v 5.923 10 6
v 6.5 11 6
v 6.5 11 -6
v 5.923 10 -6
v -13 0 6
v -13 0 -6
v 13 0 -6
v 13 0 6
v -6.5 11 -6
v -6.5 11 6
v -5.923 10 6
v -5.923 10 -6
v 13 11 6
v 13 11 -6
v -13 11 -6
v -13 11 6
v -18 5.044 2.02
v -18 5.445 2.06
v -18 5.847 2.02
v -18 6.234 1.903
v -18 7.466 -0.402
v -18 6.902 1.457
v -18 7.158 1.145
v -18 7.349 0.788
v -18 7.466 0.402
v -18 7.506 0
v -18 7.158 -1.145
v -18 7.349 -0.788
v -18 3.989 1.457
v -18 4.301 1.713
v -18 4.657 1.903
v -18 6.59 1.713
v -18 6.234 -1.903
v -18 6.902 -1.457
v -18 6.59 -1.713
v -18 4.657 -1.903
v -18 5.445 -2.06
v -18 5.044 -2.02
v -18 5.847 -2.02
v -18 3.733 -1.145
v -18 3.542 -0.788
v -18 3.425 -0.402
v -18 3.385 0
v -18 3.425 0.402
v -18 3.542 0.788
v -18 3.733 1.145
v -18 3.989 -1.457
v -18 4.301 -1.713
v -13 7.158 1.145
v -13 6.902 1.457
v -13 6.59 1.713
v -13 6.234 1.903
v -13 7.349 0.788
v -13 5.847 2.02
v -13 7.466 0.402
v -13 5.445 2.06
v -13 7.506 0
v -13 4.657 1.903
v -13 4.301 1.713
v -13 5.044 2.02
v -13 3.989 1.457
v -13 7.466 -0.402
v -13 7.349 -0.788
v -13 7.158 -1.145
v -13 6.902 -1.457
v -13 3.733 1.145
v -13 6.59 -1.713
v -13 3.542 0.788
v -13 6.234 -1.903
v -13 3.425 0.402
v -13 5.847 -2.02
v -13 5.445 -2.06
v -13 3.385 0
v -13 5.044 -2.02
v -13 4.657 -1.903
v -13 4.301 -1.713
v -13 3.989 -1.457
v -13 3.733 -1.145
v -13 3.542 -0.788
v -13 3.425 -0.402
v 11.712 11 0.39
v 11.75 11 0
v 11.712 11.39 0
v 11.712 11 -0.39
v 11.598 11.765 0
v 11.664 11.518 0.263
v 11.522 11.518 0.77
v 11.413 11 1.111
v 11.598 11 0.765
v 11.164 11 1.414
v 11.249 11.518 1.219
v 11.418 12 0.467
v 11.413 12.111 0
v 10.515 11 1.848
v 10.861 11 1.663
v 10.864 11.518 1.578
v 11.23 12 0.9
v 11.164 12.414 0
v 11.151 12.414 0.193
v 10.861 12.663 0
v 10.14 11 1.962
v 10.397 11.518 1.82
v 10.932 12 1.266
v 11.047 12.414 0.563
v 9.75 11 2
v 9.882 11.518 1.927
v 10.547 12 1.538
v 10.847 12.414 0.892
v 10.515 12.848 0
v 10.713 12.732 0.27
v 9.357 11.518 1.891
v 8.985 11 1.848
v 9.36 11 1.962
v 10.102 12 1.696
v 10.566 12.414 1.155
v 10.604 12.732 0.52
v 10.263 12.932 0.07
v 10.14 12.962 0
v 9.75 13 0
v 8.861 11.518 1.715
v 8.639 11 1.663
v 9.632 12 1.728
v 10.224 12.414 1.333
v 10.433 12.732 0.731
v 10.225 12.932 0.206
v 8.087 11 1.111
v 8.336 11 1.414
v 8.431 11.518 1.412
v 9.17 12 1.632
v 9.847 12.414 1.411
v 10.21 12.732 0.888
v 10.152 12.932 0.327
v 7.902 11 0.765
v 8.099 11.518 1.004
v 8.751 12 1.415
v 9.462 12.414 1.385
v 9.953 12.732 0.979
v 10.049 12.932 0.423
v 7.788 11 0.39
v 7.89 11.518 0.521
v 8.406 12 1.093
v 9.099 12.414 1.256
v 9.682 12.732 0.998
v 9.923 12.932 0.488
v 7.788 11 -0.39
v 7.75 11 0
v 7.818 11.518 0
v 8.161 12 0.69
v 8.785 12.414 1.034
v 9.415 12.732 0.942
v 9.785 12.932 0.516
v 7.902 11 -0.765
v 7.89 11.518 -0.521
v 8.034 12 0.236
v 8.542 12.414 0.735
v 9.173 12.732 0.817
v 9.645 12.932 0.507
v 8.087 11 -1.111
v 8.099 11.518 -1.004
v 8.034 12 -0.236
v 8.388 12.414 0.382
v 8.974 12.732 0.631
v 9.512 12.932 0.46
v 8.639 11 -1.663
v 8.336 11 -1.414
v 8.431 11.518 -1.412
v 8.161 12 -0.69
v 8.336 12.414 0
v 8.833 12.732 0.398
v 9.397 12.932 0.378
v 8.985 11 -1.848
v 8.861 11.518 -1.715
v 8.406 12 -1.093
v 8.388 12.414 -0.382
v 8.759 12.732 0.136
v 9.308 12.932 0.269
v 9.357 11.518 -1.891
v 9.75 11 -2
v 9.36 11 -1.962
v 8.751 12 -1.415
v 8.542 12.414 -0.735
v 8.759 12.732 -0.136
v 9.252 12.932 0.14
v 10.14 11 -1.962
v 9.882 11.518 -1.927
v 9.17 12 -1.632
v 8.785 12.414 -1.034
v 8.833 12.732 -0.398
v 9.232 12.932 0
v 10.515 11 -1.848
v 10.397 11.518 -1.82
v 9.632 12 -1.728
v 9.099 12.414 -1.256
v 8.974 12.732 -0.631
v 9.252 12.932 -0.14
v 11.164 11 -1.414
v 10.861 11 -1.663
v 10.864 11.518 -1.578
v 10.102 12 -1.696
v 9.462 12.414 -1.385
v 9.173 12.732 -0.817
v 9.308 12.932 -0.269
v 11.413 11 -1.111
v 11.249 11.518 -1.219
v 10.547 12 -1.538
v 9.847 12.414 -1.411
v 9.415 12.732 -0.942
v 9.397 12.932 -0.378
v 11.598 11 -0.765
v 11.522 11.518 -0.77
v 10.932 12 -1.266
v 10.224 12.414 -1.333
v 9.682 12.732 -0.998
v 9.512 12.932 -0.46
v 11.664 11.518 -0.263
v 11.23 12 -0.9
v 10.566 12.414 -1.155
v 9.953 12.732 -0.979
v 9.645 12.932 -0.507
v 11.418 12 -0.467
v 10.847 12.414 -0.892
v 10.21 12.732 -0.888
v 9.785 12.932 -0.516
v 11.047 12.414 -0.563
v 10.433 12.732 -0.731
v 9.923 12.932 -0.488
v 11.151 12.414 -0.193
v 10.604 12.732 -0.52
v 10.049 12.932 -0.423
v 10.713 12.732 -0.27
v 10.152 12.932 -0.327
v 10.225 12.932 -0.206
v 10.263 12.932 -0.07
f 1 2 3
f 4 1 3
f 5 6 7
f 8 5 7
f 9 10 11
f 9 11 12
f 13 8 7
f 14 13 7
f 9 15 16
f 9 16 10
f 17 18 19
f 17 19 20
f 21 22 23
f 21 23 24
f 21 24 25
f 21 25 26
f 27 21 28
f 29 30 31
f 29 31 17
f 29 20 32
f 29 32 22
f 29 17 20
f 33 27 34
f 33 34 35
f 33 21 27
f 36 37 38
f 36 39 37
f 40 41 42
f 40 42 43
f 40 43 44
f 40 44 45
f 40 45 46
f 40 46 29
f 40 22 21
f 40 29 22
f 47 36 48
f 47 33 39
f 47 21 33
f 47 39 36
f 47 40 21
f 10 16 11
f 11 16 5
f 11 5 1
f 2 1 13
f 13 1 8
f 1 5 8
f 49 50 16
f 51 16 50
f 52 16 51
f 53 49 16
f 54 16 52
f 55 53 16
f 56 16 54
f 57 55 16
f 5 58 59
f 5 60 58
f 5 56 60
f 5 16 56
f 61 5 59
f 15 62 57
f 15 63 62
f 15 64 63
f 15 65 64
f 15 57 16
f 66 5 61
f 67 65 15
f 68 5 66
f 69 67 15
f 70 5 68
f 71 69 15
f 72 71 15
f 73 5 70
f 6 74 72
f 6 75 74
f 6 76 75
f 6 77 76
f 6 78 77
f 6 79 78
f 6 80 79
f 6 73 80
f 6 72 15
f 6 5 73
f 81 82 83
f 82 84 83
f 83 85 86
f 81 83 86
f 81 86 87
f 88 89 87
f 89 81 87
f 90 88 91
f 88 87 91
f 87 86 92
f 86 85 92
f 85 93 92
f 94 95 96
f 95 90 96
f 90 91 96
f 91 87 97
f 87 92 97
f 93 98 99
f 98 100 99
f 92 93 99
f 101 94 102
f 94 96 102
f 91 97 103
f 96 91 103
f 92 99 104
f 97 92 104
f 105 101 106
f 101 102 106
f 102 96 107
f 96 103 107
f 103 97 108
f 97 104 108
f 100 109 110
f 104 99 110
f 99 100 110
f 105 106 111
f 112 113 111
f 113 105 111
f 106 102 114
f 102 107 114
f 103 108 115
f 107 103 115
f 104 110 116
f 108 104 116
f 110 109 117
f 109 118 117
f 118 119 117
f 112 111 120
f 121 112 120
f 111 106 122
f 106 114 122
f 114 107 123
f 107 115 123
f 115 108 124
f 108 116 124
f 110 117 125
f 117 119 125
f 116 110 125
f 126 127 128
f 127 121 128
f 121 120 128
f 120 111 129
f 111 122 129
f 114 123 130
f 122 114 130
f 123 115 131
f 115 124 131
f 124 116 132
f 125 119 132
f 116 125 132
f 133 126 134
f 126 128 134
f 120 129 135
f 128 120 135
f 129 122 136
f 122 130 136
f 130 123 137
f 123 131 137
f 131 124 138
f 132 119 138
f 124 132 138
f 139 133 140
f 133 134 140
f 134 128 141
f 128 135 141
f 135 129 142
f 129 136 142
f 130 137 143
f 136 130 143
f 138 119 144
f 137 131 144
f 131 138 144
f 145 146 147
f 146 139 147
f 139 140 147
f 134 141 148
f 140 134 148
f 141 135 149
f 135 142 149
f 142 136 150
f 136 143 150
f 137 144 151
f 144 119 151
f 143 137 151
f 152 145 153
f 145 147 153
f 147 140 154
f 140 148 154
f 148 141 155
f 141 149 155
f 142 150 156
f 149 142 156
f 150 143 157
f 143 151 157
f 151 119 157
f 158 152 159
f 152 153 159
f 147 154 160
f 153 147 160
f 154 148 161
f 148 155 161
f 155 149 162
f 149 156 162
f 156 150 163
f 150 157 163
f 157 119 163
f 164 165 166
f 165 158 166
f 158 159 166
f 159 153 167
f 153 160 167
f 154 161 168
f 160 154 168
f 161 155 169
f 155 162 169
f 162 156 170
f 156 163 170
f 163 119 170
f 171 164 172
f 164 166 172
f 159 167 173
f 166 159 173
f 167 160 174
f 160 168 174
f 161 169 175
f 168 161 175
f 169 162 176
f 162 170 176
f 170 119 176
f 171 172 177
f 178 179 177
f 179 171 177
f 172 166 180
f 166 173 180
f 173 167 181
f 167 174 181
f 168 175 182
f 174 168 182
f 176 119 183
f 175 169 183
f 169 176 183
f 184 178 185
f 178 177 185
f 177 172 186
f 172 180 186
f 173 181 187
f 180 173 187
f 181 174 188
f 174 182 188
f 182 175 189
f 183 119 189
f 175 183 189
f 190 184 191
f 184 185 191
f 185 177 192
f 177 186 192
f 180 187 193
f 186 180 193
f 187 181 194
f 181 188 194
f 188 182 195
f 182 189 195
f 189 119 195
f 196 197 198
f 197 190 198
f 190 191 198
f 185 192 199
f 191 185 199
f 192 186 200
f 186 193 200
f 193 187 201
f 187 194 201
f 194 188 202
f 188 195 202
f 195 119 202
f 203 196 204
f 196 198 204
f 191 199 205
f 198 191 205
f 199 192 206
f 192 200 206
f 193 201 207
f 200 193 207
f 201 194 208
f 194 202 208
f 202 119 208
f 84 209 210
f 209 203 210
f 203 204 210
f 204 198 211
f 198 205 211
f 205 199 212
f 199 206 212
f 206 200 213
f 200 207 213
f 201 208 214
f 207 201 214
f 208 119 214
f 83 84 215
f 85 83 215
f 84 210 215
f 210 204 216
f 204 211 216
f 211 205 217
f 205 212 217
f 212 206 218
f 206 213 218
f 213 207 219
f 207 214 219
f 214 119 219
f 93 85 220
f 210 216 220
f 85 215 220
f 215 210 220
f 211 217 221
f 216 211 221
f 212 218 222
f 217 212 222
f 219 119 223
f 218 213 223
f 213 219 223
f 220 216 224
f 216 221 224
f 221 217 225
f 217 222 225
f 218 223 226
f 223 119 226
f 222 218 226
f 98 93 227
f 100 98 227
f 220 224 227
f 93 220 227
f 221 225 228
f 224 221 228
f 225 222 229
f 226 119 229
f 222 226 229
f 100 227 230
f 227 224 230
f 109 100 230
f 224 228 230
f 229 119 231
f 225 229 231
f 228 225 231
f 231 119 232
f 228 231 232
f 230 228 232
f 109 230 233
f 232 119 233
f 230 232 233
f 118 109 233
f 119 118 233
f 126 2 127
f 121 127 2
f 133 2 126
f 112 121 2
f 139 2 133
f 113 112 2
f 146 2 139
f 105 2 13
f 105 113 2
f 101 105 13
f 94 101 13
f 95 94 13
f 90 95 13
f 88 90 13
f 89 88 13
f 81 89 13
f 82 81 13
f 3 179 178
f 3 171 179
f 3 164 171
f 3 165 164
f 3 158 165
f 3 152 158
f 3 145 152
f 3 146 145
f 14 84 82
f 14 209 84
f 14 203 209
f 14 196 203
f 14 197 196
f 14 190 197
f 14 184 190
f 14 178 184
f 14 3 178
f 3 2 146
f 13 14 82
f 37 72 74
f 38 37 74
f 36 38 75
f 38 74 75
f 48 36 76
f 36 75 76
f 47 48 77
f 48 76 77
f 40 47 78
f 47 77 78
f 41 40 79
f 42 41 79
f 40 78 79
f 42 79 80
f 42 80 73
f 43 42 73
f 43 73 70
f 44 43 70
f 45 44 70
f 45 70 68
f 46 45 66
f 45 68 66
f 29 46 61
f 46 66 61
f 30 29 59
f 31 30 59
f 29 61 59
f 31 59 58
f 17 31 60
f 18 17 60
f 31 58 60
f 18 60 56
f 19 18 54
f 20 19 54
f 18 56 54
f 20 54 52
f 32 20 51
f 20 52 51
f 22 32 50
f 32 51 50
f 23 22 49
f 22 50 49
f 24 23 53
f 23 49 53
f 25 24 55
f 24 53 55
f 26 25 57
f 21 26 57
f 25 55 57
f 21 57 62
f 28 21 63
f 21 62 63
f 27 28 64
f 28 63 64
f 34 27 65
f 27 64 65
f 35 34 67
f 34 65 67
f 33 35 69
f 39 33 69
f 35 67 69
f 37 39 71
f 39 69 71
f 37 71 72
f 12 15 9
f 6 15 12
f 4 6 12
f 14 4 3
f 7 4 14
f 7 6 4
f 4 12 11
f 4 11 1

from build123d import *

# Parameters (mm, degrees)
SKETCH_1_W          = 26
SKETCH_1_H          = 12
EXTRUDE_1_DEPTH     = 11
SKETCH_2_W          = 13
SKETCH_2_H          = 15
CUT_EXTRUDE_2_DEPTH = 1
CUT_EXTRUDE_2_DRAFT = -30
SKETCH_4_R          = 2.060062992
EXTRUDE_3_DEPTH     = 5


with BuildPart() as part:
    # 草图1 → 拉伸1 (new body)
    with BuildSketch(Plane(origin=(0, 0, 0), x_dir=(1, 0, 0), z_dir=(0, 1, 0))):
        Rectangle(SKETCH_1_W, SKETCH_1_H)
    extrude(amount=EXTRUDE_1_DEPTH)


with BuildPart() as cut_extrude_2_tool:
    # 草图2 → 拉伸2 (with draft: the straight prism first)
    with BuildSketch(Plane(origin=(0, 11, 0), x_dir=(1, 0, 0), z_dir=(0, 1, 0))):
        Rectangle(SKETCH_2_W, SKETCH_2_H)
    extrude(amount=-CUT_EXTRUDE_2_DEPTH)
    # 拉伸2: the draft: its side faces are tilted about the plane it starts from
    cut_extrude_2_sides = [cut_extrude_2_tool.faces().sort_by_distance(p)[0] for p in [
        (0, 10.5, 7.5),
        (6.5, 10.5, 0),
        (0, 10.5, -7.5),
        (-6.5, 10.5, 0),
    ]]
    draft(cut_extrude_2_sides, Plane(origin=(0, 11, 0), x_dir=(1, 0, 0), z_dir=(0, 1, 0)), CUT_EXTRUDE_2_DRAFT)


with BuildPart() as part_1:
    add(part.part)

    # 拉伸2: cut by cut_extrude_2_tool
    add(cut_extrude_2_tool.part, mode=Mode.SUBTRACT)

    # 草图3 → 旋转1 (revolve)
    with BuildSketch(Plane.XY):
        with BuildLine():
            Line((9.75, 13), (9.75, 9))
            ThreePointArc((9.75, 9), (11.75, 11), (9.75, 13))
        make_face()
    revolve(axis=Axis((9.75, 13, 0), (0, -1, 0)))

    # 草图4 → 拉伸3 (add)
    with BuildSketch(Plane.ZY.offset(13)):
        with Locations(Location((0, 5.445496221, 0), (0, 0, 180))):
            Circle(SKETCH_4_R)
    extrude(amount=EXTRUDE_3_DEPTH)


solid = part_1.part
